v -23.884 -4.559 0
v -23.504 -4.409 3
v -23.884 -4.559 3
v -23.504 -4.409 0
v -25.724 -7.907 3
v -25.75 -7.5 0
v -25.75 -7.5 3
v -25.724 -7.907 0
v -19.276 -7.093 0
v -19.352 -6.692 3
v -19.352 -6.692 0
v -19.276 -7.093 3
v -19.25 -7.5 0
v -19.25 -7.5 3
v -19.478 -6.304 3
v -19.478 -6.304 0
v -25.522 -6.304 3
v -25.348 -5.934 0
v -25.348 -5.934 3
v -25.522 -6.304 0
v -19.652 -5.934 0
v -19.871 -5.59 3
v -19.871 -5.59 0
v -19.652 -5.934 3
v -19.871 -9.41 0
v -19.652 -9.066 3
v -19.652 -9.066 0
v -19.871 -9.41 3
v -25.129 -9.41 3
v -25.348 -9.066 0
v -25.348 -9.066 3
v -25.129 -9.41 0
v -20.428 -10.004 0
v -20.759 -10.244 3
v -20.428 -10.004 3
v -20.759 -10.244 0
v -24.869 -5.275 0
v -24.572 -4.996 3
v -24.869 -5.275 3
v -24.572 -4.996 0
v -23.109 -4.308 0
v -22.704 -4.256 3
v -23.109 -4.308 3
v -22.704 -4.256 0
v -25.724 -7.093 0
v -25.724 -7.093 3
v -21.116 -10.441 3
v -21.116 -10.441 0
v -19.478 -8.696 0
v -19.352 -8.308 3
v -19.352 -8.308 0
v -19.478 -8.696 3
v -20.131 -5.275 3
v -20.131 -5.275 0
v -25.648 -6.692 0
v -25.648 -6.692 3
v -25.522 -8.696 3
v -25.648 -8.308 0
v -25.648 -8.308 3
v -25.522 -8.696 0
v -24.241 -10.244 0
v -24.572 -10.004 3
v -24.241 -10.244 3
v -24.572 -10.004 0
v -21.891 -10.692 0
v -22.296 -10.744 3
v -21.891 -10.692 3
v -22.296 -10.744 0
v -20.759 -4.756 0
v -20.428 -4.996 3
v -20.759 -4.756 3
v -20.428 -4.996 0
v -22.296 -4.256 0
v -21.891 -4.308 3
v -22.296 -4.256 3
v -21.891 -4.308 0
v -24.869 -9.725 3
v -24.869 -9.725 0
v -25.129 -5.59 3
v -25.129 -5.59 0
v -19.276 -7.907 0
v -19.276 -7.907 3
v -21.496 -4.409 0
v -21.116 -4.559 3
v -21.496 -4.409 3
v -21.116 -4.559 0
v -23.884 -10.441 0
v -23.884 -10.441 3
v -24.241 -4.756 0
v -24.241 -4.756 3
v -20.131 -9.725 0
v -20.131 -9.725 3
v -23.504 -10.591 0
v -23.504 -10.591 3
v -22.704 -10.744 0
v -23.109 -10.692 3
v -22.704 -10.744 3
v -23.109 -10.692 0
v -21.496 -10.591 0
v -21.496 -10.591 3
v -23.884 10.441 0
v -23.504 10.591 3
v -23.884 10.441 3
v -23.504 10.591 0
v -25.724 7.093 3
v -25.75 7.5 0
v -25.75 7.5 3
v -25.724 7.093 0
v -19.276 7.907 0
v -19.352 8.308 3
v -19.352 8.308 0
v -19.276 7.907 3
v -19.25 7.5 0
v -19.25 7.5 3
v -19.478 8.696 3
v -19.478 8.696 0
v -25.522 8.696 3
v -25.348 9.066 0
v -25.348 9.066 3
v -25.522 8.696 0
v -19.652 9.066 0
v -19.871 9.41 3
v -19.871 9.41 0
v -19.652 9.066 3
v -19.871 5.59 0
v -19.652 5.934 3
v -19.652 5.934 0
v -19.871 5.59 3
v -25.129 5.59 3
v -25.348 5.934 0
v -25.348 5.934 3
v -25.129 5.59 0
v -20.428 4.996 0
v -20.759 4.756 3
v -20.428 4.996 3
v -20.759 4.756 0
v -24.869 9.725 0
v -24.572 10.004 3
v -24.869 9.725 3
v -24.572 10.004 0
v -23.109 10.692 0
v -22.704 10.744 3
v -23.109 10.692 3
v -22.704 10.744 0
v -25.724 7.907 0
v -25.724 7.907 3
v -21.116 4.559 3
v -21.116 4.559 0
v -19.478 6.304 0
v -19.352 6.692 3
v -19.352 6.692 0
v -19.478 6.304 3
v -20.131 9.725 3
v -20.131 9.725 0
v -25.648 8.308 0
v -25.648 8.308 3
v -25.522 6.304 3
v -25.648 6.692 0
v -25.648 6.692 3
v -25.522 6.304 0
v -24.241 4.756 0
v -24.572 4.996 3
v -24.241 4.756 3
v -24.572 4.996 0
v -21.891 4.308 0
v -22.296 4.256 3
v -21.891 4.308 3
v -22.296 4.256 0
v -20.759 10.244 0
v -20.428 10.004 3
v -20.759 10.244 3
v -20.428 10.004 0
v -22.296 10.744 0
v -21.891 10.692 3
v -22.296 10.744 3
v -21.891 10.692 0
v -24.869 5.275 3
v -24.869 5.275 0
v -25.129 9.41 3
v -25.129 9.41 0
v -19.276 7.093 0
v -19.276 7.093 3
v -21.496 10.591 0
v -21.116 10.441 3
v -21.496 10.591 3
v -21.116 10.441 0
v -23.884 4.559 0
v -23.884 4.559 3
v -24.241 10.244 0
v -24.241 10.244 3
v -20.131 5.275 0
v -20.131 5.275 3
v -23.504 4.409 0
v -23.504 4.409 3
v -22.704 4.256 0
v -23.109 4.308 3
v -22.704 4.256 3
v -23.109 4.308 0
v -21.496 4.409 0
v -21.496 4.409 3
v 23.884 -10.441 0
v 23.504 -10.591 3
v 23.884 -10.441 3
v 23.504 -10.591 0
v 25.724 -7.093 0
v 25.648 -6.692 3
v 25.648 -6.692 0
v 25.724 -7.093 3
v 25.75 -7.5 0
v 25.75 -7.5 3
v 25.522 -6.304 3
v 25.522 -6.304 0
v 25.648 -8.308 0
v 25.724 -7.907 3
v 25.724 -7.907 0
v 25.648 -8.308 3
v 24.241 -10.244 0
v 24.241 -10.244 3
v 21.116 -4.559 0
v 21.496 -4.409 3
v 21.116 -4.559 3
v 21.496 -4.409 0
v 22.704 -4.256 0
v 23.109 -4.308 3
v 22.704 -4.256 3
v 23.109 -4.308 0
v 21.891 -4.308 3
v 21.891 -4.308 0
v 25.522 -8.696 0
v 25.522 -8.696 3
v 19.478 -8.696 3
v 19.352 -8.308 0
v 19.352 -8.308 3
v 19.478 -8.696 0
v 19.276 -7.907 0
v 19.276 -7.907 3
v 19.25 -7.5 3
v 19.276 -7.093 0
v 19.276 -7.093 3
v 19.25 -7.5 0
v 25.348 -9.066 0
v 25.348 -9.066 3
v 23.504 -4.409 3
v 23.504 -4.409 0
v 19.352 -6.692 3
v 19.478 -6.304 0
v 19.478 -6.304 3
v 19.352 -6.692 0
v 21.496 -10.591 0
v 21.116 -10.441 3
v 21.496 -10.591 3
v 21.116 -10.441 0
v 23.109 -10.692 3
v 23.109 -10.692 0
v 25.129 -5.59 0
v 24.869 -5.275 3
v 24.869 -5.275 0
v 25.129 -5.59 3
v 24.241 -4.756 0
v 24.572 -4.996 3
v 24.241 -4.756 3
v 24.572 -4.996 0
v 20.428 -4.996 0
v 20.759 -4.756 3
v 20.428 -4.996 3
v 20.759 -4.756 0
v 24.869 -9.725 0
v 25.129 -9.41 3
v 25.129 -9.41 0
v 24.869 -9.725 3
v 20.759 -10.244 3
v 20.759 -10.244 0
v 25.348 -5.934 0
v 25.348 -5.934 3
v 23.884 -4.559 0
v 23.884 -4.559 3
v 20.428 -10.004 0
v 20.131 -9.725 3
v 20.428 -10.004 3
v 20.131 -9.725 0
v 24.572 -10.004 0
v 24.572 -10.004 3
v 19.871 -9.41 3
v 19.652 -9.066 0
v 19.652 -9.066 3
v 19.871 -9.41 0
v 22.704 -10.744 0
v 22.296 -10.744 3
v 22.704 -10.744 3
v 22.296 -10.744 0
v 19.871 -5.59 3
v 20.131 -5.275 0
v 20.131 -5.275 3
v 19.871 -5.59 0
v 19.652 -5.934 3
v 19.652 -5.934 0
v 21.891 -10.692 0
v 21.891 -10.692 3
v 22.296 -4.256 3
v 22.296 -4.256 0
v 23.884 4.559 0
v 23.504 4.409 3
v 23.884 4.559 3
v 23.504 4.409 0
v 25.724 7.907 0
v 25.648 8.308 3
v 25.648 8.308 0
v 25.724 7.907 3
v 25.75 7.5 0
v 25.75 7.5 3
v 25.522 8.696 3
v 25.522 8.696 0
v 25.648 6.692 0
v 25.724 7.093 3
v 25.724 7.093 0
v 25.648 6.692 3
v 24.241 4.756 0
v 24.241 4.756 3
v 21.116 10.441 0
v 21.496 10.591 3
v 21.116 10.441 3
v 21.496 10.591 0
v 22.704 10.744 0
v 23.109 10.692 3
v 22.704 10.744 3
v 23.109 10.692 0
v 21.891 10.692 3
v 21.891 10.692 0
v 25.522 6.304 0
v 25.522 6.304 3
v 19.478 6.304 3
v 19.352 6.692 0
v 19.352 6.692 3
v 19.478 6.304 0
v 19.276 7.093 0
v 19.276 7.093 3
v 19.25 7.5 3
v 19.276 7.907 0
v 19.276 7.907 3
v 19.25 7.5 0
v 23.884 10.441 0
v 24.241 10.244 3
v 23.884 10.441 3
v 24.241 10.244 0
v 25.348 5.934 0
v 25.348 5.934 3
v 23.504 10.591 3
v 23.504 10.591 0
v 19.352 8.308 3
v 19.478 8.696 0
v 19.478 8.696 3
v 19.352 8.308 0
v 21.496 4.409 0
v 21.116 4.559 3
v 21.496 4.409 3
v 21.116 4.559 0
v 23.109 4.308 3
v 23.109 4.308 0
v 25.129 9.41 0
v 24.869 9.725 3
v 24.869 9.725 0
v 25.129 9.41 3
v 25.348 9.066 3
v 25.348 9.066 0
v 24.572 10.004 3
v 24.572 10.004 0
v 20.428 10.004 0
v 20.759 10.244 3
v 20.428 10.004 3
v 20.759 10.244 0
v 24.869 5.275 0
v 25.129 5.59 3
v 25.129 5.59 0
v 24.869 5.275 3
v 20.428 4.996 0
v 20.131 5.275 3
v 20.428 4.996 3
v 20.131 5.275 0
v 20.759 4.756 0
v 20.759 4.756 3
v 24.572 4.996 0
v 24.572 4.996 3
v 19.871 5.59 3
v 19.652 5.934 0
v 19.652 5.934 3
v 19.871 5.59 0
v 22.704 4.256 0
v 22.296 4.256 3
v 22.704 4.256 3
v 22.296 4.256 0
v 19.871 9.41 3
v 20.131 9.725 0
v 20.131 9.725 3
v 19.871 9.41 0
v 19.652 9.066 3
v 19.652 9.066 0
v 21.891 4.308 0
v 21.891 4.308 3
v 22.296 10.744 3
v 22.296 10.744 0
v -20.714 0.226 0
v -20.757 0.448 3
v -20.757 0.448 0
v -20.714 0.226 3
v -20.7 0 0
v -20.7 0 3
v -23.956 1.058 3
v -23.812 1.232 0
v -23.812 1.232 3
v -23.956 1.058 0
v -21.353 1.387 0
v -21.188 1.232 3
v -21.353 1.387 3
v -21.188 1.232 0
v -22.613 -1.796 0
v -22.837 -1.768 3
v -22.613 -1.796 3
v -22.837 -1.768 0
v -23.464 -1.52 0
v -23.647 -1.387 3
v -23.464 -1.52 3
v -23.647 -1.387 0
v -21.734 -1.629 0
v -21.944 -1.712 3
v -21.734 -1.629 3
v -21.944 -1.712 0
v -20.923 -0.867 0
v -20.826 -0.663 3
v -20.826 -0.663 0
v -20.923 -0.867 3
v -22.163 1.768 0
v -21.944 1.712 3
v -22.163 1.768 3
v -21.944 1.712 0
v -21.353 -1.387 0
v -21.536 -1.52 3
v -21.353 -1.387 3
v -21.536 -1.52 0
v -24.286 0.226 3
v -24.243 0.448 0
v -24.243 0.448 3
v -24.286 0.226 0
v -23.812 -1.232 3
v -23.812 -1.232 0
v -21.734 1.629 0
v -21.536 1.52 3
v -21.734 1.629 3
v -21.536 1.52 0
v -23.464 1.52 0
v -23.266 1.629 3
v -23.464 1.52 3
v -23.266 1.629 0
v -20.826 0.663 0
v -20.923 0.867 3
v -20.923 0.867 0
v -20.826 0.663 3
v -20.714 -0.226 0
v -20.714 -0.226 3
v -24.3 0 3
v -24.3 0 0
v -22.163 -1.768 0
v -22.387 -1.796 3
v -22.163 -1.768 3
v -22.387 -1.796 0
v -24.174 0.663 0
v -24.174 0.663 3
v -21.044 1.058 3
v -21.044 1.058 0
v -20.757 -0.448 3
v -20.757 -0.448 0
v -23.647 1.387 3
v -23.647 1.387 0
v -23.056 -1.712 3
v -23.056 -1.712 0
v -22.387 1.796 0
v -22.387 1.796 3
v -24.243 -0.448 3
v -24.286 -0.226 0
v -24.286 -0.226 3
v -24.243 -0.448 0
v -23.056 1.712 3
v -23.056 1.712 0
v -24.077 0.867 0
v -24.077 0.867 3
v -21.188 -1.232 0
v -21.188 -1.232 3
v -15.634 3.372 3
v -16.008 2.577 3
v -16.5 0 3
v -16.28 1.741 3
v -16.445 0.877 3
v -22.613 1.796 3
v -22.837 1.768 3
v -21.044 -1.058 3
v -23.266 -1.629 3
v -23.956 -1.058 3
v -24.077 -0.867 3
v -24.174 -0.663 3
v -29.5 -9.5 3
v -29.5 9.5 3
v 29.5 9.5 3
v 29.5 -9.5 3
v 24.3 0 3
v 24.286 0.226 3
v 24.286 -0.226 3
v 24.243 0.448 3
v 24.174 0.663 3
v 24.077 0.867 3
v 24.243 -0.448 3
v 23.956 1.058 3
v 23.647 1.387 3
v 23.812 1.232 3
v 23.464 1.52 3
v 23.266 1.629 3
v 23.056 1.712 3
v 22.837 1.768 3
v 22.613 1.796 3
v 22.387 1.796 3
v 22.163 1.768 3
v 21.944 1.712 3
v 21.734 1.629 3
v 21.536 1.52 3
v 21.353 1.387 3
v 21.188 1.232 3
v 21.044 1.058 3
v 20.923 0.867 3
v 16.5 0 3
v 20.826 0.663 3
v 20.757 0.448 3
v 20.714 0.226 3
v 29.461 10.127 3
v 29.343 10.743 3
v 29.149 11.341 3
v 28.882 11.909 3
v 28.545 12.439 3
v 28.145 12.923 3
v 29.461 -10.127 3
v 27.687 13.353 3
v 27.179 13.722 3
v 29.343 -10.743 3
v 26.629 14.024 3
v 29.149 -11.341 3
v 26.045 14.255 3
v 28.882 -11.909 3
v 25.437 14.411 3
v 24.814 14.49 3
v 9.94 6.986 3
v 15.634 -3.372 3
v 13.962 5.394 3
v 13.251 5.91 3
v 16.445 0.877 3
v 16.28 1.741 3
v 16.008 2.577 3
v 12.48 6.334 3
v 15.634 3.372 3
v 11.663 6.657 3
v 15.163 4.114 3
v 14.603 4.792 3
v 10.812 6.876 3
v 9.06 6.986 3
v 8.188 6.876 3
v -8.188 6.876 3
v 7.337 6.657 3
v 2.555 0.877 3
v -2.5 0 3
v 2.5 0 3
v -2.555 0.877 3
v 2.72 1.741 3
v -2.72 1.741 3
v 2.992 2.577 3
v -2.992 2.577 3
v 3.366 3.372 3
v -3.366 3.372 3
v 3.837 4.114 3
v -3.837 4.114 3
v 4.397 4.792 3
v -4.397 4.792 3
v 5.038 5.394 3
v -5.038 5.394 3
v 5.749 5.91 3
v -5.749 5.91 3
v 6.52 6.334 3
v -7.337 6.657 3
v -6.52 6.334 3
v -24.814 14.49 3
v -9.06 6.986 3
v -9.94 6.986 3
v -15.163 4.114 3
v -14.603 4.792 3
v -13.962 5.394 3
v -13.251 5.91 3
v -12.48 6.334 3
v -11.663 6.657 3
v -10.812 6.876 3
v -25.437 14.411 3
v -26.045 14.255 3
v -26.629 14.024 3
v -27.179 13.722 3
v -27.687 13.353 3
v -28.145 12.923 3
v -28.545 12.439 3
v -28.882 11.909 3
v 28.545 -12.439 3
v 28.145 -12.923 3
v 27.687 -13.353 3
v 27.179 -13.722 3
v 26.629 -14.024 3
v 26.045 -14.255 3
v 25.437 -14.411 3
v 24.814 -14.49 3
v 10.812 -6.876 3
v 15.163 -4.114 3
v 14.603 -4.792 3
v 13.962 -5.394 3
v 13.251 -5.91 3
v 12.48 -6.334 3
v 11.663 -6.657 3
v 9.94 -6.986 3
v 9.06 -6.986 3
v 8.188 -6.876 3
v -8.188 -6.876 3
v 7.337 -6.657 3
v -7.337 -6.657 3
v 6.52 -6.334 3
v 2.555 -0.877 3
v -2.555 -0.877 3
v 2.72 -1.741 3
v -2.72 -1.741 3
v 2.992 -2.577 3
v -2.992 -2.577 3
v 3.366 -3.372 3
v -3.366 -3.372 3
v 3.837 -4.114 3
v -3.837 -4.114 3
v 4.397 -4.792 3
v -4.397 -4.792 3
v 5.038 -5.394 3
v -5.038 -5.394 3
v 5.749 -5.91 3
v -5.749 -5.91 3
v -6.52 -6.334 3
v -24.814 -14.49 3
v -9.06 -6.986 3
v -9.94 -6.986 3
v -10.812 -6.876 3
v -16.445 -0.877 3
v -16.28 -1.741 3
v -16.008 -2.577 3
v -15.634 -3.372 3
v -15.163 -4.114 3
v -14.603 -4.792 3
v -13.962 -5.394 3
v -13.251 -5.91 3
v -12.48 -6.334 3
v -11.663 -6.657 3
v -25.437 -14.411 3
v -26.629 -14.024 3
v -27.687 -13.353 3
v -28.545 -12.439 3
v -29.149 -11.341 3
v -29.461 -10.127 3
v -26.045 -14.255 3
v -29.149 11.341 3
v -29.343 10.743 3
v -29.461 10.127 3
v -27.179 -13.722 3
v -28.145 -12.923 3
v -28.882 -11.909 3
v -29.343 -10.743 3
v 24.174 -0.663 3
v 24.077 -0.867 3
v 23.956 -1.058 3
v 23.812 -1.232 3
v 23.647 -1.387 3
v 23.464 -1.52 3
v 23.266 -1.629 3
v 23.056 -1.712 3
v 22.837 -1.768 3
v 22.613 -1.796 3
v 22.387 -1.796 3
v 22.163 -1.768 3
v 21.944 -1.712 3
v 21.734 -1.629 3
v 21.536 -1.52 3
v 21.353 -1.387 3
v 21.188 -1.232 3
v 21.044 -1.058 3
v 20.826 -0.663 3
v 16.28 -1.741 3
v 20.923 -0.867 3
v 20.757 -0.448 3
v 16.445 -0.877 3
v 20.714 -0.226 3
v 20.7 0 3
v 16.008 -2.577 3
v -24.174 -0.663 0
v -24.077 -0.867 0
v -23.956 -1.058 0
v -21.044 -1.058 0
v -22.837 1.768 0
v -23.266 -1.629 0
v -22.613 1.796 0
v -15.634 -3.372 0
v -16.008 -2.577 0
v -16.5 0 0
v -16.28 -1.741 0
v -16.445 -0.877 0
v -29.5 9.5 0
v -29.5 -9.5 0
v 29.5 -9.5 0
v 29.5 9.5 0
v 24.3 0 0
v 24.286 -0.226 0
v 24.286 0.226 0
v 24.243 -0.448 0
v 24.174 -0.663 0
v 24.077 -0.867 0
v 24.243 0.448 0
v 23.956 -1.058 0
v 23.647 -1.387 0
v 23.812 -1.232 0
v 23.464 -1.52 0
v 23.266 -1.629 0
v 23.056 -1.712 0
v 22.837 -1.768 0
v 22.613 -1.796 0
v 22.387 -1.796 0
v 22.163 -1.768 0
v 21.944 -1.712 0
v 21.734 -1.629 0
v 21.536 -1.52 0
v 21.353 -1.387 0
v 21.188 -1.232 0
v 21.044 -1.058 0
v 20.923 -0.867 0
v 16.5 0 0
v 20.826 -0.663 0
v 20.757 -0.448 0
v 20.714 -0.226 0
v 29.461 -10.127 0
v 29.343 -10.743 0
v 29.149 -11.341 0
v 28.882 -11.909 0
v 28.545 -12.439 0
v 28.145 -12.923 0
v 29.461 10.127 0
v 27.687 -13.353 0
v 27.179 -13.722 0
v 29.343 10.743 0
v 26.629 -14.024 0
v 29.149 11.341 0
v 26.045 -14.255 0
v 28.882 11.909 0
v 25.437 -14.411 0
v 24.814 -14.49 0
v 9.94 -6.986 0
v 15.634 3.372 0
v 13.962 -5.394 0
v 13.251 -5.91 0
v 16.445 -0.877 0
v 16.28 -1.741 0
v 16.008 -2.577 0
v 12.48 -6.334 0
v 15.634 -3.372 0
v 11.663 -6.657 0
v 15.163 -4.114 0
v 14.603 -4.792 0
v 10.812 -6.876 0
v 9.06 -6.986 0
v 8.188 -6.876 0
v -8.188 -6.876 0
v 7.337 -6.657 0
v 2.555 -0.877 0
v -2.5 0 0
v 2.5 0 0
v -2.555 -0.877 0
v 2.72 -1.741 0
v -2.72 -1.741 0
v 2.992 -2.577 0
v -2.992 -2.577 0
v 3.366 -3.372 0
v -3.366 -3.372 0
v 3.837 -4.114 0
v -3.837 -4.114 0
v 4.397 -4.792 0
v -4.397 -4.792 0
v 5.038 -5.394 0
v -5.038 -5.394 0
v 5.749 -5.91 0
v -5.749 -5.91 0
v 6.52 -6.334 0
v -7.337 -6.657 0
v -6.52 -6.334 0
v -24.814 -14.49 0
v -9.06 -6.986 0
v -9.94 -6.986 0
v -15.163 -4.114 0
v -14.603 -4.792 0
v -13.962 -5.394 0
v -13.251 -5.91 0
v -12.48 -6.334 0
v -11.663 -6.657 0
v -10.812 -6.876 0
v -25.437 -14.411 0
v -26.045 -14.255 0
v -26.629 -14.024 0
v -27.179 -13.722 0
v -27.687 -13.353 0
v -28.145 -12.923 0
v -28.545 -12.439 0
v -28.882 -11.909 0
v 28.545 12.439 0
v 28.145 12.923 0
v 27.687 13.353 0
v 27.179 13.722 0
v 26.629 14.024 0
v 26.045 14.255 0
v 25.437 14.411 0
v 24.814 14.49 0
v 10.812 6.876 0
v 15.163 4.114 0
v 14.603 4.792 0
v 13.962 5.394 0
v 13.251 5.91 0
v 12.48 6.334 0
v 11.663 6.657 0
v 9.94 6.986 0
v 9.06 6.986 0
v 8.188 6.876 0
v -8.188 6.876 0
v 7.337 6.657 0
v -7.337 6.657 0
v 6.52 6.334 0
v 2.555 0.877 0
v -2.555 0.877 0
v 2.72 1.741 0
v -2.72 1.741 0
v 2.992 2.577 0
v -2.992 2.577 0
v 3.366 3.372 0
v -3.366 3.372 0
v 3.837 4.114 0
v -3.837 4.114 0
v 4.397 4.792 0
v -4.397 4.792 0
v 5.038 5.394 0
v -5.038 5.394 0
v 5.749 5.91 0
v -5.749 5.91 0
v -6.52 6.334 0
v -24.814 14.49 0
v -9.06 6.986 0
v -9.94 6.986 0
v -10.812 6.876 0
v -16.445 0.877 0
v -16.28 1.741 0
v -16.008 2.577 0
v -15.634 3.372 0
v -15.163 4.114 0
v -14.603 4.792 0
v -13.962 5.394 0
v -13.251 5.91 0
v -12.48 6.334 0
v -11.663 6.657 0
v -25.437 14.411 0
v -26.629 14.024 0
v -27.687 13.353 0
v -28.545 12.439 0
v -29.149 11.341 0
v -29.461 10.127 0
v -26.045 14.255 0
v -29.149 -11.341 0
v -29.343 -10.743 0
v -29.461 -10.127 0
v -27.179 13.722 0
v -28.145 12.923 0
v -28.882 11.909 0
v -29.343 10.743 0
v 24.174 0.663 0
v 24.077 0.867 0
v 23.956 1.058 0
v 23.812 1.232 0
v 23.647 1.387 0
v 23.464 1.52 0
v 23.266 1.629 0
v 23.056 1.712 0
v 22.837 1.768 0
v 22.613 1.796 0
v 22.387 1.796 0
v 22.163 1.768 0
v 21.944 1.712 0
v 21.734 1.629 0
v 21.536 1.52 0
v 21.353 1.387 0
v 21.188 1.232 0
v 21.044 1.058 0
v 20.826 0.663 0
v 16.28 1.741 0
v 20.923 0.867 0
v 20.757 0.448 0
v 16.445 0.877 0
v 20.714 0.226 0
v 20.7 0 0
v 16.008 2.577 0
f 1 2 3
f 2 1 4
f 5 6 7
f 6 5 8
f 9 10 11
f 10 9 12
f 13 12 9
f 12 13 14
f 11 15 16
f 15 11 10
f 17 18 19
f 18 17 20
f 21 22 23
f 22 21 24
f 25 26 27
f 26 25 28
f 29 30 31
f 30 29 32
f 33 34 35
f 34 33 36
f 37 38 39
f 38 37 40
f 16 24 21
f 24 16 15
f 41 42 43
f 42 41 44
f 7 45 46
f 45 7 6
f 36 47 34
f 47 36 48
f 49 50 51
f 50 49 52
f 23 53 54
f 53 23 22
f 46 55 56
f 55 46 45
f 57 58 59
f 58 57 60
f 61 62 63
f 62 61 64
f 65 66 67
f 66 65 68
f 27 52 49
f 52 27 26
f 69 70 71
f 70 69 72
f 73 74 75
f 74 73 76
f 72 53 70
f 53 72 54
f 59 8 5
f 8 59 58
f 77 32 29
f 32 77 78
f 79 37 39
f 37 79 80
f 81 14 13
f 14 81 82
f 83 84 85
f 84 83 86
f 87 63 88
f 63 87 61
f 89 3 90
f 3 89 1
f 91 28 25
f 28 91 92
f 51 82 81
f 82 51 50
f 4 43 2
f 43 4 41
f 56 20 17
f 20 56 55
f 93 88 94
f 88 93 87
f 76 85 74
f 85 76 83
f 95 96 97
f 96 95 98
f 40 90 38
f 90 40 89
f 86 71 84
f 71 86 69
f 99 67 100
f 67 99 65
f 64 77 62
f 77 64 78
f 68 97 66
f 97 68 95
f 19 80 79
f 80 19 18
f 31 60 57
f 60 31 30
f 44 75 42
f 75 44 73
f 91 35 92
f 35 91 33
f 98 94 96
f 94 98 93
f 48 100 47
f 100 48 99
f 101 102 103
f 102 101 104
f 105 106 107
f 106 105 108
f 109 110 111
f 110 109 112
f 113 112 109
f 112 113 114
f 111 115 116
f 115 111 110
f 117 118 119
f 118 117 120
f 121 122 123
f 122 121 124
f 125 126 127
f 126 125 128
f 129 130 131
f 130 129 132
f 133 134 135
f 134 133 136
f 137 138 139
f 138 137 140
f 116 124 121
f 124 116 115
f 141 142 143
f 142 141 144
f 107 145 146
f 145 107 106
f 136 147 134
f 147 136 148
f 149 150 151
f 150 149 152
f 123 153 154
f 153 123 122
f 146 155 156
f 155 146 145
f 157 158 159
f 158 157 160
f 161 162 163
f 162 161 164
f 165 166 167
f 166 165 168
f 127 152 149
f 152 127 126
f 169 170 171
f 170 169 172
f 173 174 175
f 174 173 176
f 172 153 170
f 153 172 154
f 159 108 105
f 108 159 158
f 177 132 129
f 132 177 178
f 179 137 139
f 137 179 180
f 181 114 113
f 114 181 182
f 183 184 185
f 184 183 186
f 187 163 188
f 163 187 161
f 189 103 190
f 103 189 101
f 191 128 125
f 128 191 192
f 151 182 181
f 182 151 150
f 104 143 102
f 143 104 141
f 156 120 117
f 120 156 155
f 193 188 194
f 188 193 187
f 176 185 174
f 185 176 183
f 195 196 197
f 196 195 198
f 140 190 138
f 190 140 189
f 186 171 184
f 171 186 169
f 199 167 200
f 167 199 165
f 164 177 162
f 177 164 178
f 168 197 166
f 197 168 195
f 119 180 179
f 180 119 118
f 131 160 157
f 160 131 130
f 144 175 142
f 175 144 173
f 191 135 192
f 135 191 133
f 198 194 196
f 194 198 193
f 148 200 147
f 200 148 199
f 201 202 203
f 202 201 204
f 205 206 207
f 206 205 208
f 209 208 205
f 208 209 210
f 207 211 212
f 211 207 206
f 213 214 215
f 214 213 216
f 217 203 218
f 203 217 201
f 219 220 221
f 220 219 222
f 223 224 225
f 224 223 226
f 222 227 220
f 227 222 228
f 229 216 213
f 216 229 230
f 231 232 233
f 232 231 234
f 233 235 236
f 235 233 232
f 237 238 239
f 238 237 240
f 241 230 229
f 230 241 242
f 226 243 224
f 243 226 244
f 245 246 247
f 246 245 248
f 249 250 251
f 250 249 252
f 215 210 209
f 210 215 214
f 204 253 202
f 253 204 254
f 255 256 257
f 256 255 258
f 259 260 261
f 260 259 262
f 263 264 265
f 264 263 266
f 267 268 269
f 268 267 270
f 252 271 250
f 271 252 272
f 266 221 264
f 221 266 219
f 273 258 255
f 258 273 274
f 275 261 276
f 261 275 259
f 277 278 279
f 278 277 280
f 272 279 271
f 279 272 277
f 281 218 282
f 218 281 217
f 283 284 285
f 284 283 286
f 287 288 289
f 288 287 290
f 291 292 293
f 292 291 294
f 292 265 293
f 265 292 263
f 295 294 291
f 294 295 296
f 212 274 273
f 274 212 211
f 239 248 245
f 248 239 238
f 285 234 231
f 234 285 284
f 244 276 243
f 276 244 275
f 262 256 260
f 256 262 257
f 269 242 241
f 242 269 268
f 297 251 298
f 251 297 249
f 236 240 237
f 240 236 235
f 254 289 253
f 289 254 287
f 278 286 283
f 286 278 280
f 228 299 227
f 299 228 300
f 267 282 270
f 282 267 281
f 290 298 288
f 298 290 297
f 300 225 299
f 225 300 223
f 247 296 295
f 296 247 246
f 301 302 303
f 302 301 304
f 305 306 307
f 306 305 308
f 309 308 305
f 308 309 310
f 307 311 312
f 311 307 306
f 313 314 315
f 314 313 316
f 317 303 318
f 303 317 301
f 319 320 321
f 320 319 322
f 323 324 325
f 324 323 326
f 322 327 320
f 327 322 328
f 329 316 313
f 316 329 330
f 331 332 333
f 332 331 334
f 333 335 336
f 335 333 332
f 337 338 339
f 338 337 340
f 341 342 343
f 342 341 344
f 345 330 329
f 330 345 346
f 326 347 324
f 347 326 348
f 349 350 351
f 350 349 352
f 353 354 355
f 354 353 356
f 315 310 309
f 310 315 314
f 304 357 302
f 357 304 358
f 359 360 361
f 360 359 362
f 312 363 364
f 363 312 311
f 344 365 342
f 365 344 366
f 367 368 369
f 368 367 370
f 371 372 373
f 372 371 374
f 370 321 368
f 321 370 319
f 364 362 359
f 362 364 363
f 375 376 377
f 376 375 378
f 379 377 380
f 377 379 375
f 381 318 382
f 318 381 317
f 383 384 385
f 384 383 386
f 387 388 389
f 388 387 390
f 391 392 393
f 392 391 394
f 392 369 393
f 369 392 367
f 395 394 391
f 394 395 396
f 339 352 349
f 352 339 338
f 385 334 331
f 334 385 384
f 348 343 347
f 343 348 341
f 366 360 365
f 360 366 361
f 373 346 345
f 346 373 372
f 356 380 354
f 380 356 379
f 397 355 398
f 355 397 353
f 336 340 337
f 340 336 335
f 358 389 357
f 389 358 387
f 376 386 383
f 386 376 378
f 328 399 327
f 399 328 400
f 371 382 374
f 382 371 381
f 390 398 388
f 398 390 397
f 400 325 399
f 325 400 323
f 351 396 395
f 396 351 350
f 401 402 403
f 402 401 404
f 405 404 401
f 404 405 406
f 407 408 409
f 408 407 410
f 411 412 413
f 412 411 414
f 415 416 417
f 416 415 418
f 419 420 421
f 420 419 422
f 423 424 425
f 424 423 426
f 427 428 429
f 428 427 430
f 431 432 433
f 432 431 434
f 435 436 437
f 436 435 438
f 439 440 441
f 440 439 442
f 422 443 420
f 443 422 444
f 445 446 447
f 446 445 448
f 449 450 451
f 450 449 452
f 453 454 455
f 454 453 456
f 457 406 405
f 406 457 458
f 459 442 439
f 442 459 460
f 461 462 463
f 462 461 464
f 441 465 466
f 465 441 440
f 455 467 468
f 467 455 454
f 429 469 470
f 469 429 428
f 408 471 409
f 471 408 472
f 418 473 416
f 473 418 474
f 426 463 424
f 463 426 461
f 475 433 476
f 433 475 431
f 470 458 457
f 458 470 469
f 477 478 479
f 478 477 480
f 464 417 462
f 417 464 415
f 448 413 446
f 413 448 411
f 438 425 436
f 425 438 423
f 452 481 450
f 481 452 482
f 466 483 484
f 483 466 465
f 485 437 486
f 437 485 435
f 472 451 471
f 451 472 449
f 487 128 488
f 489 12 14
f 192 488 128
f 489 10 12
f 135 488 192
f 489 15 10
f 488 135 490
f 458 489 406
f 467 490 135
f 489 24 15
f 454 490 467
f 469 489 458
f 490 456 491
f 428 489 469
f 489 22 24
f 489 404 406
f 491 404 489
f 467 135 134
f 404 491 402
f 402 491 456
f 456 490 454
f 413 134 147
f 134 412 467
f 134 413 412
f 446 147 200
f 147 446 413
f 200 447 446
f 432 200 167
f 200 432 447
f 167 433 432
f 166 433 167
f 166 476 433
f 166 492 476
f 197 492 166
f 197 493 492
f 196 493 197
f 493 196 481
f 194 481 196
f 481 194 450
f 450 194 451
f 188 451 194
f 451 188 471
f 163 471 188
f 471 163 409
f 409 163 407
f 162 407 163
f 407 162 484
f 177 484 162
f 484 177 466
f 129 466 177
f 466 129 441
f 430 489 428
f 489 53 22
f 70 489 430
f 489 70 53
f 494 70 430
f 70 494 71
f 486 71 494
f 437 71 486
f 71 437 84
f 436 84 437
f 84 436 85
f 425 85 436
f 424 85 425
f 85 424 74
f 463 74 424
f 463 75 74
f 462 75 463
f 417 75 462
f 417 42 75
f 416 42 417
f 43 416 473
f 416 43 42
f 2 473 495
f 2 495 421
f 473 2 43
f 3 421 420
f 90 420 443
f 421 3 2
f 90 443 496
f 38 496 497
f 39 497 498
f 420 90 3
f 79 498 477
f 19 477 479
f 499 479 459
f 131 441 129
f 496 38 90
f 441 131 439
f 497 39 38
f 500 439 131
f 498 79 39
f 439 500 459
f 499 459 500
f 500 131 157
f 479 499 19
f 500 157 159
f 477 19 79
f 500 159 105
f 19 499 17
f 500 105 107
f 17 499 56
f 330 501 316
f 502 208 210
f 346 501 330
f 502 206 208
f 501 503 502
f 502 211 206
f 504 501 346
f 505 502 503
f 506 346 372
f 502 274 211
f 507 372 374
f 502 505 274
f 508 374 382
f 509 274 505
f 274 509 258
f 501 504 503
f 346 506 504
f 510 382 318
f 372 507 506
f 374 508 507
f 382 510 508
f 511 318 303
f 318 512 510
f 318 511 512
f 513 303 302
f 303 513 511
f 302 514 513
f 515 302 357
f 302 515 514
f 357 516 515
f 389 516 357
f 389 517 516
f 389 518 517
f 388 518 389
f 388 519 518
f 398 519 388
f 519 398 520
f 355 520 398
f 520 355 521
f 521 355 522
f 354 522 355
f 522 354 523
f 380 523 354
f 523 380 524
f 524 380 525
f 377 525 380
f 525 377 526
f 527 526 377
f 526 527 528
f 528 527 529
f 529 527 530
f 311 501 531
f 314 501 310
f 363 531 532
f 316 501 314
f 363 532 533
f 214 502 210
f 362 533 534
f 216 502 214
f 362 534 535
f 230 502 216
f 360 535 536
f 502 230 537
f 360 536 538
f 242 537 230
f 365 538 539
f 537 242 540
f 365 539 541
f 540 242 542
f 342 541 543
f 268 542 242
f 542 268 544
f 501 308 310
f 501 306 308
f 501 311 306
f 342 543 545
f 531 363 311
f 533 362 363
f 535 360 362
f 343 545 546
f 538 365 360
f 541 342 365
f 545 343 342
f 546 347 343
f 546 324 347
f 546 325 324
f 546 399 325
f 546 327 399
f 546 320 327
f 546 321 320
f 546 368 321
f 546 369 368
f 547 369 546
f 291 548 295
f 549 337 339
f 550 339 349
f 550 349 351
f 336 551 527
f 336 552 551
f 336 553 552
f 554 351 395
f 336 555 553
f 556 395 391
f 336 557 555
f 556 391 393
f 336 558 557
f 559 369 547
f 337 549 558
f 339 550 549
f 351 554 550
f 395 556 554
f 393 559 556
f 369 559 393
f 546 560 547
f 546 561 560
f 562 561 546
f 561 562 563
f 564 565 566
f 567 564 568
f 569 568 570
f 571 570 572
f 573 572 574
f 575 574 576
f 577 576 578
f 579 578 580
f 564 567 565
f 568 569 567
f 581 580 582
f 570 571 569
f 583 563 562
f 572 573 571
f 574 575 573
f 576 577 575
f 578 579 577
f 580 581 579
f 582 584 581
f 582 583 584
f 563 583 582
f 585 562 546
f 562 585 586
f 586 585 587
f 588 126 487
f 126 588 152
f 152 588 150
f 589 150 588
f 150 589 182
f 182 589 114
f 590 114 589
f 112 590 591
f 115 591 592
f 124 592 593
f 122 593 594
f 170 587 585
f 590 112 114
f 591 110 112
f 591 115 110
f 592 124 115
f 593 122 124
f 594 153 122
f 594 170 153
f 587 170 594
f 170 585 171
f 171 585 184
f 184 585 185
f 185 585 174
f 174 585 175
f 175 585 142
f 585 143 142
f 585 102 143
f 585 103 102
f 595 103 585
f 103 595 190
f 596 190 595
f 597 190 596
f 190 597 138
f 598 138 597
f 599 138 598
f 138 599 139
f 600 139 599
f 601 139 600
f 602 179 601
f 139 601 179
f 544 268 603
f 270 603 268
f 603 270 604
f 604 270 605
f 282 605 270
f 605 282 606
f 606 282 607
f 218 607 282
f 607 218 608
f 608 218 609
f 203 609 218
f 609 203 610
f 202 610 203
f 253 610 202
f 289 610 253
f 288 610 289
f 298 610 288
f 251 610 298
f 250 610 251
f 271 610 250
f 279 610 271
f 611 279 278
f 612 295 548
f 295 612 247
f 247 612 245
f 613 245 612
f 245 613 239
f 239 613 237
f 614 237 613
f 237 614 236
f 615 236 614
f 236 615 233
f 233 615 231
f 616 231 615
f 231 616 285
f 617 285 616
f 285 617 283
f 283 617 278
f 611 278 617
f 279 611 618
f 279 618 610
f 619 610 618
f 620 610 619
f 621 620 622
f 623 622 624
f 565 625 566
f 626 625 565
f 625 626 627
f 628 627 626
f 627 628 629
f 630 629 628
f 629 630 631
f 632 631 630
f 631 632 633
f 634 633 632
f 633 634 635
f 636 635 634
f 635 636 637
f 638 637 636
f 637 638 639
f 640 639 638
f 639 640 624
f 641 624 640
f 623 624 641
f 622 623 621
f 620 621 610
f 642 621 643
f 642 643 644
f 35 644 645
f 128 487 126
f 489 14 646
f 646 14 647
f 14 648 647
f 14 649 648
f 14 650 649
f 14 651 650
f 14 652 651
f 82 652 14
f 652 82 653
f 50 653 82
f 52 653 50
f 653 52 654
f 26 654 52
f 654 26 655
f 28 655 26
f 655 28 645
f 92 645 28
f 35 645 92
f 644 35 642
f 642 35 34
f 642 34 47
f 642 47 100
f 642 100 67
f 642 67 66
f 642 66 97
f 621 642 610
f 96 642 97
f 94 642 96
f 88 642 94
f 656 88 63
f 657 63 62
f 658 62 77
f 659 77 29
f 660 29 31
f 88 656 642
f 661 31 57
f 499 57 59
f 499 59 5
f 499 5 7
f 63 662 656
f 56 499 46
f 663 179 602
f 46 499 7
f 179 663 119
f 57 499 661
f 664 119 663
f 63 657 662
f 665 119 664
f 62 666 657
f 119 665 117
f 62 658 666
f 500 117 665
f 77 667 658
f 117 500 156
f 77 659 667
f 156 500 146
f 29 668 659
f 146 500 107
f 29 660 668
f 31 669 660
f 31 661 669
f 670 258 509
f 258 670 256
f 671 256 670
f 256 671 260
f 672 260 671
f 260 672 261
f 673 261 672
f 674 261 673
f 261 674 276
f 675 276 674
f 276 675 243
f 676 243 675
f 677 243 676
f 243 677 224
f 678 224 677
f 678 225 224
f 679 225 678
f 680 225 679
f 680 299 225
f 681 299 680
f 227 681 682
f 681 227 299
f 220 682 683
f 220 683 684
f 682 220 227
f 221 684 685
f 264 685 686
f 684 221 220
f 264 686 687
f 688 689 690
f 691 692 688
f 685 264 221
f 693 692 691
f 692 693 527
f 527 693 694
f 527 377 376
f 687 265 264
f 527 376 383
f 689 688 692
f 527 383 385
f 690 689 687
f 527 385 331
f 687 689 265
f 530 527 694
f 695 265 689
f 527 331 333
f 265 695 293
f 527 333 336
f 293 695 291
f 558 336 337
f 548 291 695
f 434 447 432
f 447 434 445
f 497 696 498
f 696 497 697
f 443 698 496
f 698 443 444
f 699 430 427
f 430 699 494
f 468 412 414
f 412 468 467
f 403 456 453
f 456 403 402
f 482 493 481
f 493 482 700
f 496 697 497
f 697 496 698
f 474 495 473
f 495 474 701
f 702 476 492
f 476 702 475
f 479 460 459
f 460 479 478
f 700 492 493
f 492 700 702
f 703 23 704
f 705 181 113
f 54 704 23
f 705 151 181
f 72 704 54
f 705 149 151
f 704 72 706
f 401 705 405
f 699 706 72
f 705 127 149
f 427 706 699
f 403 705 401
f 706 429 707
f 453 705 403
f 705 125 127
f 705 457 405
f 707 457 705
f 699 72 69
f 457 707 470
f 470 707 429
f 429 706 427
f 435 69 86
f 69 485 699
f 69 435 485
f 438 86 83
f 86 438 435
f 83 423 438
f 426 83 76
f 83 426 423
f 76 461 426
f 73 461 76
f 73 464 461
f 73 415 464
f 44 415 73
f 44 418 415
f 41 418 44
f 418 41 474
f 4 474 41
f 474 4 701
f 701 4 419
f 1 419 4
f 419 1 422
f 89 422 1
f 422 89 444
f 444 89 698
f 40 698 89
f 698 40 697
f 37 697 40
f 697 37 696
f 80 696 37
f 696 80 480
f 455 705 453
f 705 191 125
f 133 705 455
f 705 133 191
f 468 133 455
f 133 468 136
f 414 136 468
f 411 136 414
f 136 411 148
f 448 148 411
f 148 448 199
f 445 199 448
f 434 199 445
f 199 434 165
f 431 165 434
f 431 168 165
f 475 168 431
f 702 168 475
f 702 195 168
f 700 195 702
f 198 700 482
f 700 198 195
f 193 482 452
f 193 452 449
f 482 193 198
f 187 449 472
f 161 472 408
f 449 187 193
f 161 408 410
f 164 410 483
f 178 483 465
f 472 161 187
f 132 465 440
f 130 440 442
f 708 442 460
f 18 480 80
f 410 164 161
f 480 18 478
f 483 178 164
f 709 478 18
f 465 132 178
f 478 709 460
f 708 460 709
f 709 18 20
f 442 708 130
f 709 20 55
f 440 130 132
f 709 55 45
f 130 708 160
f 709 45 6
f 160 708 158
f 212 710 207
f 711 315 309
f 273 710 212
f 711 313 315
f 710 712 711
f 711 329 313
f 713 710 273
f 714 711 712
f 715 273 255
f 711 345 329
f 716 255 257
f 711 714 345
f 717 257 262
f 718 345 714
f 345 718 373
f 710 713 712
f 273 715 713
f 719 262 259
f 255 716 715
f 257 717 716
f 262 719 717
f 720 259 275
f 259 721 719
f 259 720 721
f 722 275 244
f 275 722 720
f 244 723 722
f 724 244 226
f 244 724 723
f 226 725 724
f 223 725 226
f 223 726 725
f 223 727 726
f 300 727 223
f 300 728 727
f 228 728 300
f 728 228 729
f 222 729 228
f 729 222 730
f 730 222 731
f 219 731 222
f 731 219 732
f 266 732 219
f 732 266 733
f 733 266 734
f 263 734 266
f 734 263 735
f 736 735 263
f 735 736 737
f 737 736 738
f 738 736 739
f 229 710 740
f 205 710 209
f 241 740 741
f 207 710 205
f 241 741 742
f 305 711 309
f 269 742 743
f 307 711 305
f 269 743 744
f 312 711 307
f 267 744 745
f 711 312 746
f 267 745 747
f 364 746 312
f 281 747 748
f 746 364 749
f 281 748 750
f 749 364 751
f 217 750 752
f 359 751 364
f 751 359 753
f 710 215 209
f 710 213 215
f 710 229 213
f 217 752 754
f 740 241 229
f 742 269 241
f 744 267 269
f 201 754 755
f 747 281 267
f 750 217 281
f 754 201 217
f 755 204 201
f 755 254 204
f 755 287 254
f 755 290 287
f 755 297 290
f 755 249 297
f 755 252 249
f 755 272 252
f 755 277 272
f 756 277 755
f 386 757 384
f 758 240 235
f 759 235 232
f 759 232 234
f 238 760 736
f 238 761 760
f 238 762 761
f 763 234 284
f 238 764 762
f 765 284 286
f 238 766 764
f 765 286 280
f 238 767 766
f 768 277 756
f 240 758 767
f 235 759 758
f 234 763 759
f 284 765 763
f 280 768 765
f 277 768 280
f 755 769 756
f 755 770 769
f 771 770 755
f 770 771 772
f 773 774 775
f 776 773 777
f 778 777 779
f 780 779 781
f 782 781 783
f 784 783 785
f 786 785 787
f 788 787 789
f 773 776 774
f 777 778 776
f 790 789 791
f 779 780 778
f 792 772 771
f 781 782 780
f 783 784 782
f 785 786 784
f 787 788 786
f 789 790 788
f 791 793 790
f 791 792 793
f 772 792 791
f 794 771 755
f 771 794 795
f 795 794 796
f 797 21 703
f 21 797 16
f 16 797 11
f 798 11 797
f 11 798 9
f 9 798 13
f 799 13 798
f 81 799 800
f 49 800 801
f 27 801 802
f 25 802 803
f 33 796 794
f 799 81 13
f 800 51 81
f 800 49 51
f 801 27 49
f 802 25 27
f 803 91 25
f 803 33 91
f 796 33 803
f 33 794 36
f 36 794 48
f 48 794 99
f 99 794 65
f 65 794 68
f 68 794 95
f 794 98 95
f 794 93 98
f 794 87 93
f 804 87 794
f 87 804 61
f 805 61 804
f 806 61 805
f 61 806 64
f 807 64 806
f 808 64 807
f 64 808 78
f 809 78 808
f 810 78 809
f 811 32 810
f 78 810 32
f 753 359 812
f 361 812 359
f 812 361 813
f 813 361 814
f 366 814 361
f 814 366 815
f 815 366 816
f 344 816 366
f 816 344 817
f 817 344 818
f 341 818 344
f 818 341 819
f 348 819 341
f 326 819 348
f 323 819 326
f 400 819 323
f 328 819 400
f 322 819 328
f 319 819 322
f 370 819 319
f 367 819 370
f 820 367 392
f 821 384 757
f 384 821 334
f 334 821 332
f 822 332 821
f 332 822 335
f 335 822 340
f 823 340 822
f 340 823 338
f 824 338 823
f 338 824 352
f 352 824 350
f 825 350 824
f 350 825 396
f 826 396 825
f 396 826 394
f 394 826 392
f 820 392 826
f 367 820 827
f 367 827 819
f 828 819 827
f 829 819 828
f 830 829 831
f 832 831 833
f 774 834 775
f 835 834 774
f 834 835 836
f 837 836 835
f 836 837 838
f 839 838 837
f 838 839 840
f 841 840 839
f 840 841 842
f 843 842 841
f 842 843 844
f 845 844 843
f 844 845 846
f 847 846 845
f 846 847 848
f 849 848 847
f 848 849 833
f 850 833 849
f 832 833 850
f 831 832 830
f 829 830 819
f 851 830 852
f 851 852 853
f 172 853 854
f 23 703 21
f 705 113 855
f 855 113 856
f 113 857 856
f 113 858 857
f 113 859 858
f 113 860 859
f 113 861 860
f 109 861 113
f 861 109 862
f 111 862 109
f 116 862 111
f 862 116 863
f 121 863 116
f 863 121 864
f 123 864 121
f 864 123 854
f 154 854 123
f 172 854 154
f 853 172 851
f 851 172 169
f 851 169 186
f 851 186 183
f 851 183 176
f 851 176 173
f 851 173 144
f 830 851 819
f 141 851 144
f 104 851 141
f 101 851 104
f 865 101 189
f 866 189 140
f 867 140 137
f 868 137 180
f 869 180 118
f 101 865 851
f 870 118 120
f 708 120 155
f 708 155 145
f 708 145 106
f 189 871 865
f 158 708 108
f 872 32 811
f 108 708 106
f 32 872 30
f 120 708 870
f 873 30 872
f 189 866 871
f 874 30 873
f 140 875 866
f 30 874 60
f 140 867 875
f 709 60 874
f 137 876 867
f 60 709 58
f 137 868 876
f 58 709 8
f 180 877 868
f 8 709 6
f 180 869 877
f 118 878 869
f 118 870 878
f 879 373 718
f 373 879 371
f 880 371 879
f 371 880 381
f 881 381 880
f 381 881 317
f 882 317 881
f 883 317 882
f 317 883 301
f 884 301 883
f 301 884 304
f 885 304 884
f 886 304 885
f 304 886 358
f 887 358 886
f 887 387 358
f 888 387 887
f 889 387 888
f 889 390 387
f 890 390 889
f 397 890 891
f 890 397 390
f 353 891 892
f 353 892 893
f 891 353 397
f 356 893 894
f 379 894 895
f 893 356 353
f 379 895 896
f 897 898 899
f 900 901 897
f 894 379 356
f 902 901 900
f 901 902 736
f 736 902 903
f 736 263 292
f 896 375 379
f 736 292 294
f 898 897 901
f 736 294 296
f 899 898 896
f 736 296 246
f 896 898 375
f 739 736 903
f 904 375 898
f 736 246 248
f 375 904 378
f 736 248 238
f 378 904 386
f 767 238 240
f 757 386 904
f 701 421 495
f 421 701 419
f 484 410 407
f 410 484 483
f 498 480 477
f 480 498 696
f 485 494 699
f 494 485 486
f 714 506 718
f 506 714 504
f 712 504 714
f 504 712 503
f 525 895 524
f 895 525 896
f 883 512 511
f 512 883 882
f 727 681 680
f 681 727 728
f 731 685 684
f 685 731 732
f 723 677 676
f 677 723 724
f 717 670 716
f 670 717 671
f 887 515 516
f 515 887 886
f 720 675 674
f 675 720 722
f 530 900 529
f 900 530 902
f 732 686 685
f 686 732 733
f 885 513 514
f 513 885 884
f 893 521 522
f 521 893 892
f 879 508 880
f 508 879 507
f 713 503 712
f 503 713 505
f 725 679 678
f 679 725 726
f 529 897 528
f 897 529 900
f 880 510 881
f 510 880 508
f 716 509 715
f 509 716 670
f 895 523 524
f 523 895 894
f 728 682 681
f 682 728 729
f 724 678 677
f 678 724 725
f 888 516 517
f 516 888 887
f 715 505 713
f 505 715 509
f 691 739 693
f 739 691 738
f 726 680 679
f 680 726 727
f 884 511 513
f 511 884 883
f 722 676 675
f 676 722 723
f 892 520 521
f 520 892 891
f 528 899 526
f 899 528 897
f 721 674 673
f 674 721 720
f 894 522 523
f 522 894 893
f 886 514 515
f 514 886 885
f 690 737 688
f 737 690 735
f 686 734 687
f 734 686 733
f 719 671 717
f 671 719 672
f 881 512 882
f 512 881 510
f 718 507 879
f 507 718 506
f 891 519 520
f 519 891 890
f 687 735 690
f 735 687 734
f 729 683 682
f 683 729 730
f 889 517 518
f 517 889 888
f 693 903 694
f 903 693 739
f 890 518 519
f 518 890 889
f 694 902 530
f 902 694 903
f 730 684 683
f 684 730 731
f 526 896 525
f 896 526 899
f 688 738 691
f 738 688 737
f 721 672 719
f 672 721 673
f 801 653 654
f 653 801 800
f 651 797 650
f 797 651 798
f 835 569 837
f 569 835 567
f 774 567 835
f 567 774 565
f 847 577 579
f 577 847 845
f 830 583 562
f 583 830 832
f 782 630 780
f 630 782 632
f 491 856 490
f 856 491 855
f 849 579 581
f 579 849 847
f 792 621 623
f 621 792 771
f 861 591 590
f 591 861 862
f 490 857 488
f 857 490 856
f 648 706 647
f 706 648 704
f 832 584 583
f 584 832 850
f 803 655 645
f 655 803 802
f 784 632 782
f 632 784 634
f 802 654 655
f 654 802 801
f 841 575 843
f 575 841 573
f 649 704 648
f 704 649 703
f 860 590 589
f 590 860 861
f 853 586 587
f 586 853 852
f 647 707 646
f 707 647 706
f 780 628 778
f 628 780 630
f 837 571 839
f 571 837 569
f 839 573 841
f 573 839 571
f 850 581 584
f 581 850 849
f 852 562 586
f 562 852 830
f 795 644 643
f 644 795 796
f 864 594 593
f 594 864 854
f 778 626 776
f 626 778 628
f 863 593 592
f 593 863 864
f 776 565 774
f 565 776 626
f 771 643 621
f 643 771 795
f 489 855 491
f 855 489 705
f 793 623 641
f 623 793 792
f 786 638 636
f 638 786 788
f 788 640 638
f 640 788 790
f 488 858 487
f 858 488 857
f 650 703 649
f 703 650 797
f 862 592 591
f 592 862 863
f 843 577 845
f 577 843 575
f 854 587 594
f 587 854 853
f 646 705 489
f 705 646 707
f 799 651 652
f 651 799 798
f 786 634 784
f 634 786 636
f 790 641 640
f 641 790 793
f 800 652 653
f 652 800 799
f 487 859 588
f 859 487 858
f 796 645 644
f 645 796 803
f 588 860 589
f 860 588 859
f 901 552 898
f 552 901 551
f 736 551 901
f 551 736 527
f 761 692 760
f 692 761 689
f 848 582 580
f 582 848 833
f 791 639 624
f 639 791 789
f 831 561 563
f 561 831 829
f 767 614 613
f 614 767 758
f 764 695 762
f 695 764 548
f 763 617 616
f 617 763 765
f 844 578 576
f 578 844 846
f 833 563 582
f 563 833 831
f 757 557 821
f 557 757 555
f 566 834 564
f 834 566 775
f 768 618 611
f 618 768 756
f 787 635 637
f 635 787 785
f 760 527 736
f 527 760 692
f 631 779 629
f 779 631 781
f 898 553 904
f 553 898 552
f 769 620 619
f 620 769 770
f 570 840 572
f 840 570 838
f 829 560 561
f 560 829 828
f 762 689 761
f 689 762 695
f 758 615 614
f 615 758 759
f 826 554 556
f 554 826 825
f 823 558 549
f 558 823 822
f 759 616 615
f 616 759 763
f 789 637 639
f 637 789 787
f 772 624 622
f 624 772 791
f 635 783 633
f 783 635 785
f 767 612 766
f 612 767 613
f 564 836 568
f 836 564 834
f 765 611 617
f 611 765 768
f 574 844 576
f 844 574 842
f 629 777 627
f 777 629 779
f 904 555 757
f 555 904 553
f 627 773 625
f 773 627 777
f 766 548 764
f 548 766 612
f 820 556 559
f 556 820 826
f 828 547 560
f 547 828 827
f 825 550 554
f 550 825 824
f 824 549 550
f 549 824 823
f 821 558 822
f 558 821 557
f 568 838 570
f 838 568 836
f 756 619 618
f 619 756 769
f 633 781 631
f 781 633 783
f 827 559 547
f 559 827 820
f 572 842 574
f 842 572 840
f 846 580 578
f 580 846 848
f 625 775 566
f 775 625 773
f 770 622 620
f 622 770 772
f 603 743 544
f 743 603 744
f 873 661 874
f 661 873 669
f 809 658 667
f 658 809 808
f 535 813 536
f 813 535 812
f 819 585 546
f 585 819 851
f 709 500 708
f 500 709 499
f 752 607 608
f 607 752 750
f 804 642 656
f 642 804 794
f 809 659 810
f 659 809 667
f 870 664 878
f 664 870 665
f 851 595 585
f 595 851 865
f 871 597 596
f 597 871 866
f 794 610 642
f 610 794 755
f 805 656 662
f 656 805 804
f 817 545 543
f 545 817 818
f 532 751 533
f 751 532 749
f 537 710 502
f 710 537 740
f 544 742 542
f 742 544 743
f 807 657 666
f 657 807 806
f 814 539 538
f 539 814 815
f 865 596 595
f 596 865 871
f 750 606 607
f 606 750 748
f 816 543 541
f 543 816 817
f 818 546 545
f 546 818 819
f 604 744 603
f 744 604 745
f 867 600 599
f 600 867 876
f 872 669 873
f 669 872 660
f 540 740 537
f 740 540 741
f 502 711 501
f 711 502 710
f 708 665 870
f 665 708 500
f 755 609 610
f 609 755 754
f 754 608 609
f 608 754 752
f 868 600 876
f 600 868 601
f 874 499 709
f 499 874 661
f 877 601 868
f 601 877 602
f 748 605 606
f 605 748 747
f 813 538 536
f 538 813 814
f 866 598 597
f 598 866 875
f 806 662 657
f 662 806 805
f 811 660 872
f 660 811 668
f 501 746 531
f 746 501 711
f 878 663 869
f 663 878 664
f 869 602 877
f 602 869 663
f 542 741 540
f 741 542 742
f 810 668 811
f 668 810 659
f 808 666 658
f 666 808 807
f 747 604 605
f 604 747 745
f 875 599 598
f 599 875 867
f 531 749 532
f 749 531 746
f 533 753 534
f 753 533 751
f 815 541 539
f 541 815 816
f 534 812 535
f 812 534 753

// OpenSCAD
$fn = 50;


difference() {
	union() {
		hull() {
			translate(v = [-24.5000000000, 9.5000000000, 0]) {
				cylinder(h = 3, r = 5);
			}
			translate(v = [24.5000000000, 9.5000000000, 0]) {
				cylinder(h = 3, r = 5);
			}
			translate(v = [-24.5000000000, -9.5000000000, 0]) {
				cylinder(h = 3, r = 5);
			}
			translate(v = [24.5000000000, -9.5000000000, 0]) {
				cylinder(h = 3, r = 5);
			}
		}
	}
	union() {
		#translate(v = [-22.5000000000, -7.5000000000, 0]) {
			cylinder(h = 3, r = 3.2500000000);
		}
		#translate(v = [-22.5000000000, 7.5000000000, 0]) {
			cylinder(h = 3, r = 3.2500000000);
		}
		#translate(v = [22.5000000000, -7.5000000000, 0]) {
			cylinder(h = 3, r = 3.2500000000);
		}
		#translate(v = [22.5000000000, 7.5000000000, 0]) {
			cylinder(h = 3, r = 3.2500000000);
		}
		#translate(v = [-22.5000000000, -7.5000000000, -100.0000000000]) {
			cylinder(h = 200, r = 3.2500000000);
		}
		#translate(v = [-22.5000000000, 7.5000000000, -100.0000000000]) {
			cylinder(h = 200, r = 3.2500000000);
		}
		#translate(v = [22.5000000000, -7.5000000000, -100.0000000000]) {
			cylinder(h = 200, r = 3.2500000000);
		}
		#translate(v = [22.5000000000, 7.5000000000, -100.0000000000]) {
			cylinder(h = 200, r = 3.2500000000);
		}
		#translate(v = [-22.5000000000, -7.5000000000, 0]) {
			cylinder(h = 3, r = 1.8000000000);
		}
		#translate(v = [-22.5000000000, 0.0000000000, 0]) {
			cylinder(h = 3, r = 1.8000000000);
		}
		#translate(v = [-22.5000000000, 7.5000000000, 0]) {
			cylinder(h = 3, r = 1.8000000000);
		}
		#translate(v = [22.5000000000, -7.5000000000, 0]) {
			cylinder(h = 3, r = 1.8000000000);
		}
		#translate(v = [22.5000000000, 0.0000000000, 0]) {
			cylinder(h = 3, r = 1.8000000000);
		}
		#translate(v = [22.5000000000, 7.5000000000, 0]) {
			cylinder(h = 3, r = 1.8000000000);
		}
		#translate(v = [-22.5000000000, -7.5000000000, 0]) {
			cylinder(h = 3, r = 1.8000000000);
		}
		#translate(v = [-22.5000000000, 0.0000000000, 0]) {
			cylinder(h = 3, r = 1.8000000000);
		}
		#translate(v = [-22.5000000000, 7.5000000000, 0]) {
			cylinder(h = 3, r = 1.8000000000);
		}
		#translate(v = [22.5000000000, -7.5000000000, 0]) {
			cylinder(h = 3, r = 1.8000000000);
		}
		#translate(v = [22.5000000000, 0.0000000000, 0]) {
			cylinder(h = 3, r = 1.8000000000);
		}
		#translate(v = [22.5000000000, 7.5000000000, 0]) {
			cylinder(h = 3, r = 1.8000000000);
		}
		#translate(v = [-22.5000000000, -7.5000000000, 0]) {
			cylinder(h = 3, r = 1.8000000000);
		}
		#translate(v = [-22.5000000000, 0.0000000000, 0]) {
			cylinder(h = 3, r = 1.8000000000);
		}
		#translate(v = [-22.5000000000, 7.5000000000, 0]) {
			cylinder(h = 3, r = 1.8000000000);
		}
		#translate(v = [22.5000000000, -7.5000000000, 0]) {
			cylinder(h = 3, r = 1.8000000000);
		}
		#translate(v = [22.5000000000, 0.0000000000, 0]) {
			cylinder(h = 3, r = 1.8000000000);
		}
		#translate(v = [22.5000000000, 7.5000000000, 0]) {
			cylinder(h = 3, r = 1.8000000000);
		}
		#translate(v = [-9.5000000000, 0, 0]) {
			cylinder(h = 3, r = 7.0000000000);
		}
		#translate(v = [9.5000000000, 0, 0]) {
			cylinder(h = 3, r = 7.0000000000);
		}
	}
}
